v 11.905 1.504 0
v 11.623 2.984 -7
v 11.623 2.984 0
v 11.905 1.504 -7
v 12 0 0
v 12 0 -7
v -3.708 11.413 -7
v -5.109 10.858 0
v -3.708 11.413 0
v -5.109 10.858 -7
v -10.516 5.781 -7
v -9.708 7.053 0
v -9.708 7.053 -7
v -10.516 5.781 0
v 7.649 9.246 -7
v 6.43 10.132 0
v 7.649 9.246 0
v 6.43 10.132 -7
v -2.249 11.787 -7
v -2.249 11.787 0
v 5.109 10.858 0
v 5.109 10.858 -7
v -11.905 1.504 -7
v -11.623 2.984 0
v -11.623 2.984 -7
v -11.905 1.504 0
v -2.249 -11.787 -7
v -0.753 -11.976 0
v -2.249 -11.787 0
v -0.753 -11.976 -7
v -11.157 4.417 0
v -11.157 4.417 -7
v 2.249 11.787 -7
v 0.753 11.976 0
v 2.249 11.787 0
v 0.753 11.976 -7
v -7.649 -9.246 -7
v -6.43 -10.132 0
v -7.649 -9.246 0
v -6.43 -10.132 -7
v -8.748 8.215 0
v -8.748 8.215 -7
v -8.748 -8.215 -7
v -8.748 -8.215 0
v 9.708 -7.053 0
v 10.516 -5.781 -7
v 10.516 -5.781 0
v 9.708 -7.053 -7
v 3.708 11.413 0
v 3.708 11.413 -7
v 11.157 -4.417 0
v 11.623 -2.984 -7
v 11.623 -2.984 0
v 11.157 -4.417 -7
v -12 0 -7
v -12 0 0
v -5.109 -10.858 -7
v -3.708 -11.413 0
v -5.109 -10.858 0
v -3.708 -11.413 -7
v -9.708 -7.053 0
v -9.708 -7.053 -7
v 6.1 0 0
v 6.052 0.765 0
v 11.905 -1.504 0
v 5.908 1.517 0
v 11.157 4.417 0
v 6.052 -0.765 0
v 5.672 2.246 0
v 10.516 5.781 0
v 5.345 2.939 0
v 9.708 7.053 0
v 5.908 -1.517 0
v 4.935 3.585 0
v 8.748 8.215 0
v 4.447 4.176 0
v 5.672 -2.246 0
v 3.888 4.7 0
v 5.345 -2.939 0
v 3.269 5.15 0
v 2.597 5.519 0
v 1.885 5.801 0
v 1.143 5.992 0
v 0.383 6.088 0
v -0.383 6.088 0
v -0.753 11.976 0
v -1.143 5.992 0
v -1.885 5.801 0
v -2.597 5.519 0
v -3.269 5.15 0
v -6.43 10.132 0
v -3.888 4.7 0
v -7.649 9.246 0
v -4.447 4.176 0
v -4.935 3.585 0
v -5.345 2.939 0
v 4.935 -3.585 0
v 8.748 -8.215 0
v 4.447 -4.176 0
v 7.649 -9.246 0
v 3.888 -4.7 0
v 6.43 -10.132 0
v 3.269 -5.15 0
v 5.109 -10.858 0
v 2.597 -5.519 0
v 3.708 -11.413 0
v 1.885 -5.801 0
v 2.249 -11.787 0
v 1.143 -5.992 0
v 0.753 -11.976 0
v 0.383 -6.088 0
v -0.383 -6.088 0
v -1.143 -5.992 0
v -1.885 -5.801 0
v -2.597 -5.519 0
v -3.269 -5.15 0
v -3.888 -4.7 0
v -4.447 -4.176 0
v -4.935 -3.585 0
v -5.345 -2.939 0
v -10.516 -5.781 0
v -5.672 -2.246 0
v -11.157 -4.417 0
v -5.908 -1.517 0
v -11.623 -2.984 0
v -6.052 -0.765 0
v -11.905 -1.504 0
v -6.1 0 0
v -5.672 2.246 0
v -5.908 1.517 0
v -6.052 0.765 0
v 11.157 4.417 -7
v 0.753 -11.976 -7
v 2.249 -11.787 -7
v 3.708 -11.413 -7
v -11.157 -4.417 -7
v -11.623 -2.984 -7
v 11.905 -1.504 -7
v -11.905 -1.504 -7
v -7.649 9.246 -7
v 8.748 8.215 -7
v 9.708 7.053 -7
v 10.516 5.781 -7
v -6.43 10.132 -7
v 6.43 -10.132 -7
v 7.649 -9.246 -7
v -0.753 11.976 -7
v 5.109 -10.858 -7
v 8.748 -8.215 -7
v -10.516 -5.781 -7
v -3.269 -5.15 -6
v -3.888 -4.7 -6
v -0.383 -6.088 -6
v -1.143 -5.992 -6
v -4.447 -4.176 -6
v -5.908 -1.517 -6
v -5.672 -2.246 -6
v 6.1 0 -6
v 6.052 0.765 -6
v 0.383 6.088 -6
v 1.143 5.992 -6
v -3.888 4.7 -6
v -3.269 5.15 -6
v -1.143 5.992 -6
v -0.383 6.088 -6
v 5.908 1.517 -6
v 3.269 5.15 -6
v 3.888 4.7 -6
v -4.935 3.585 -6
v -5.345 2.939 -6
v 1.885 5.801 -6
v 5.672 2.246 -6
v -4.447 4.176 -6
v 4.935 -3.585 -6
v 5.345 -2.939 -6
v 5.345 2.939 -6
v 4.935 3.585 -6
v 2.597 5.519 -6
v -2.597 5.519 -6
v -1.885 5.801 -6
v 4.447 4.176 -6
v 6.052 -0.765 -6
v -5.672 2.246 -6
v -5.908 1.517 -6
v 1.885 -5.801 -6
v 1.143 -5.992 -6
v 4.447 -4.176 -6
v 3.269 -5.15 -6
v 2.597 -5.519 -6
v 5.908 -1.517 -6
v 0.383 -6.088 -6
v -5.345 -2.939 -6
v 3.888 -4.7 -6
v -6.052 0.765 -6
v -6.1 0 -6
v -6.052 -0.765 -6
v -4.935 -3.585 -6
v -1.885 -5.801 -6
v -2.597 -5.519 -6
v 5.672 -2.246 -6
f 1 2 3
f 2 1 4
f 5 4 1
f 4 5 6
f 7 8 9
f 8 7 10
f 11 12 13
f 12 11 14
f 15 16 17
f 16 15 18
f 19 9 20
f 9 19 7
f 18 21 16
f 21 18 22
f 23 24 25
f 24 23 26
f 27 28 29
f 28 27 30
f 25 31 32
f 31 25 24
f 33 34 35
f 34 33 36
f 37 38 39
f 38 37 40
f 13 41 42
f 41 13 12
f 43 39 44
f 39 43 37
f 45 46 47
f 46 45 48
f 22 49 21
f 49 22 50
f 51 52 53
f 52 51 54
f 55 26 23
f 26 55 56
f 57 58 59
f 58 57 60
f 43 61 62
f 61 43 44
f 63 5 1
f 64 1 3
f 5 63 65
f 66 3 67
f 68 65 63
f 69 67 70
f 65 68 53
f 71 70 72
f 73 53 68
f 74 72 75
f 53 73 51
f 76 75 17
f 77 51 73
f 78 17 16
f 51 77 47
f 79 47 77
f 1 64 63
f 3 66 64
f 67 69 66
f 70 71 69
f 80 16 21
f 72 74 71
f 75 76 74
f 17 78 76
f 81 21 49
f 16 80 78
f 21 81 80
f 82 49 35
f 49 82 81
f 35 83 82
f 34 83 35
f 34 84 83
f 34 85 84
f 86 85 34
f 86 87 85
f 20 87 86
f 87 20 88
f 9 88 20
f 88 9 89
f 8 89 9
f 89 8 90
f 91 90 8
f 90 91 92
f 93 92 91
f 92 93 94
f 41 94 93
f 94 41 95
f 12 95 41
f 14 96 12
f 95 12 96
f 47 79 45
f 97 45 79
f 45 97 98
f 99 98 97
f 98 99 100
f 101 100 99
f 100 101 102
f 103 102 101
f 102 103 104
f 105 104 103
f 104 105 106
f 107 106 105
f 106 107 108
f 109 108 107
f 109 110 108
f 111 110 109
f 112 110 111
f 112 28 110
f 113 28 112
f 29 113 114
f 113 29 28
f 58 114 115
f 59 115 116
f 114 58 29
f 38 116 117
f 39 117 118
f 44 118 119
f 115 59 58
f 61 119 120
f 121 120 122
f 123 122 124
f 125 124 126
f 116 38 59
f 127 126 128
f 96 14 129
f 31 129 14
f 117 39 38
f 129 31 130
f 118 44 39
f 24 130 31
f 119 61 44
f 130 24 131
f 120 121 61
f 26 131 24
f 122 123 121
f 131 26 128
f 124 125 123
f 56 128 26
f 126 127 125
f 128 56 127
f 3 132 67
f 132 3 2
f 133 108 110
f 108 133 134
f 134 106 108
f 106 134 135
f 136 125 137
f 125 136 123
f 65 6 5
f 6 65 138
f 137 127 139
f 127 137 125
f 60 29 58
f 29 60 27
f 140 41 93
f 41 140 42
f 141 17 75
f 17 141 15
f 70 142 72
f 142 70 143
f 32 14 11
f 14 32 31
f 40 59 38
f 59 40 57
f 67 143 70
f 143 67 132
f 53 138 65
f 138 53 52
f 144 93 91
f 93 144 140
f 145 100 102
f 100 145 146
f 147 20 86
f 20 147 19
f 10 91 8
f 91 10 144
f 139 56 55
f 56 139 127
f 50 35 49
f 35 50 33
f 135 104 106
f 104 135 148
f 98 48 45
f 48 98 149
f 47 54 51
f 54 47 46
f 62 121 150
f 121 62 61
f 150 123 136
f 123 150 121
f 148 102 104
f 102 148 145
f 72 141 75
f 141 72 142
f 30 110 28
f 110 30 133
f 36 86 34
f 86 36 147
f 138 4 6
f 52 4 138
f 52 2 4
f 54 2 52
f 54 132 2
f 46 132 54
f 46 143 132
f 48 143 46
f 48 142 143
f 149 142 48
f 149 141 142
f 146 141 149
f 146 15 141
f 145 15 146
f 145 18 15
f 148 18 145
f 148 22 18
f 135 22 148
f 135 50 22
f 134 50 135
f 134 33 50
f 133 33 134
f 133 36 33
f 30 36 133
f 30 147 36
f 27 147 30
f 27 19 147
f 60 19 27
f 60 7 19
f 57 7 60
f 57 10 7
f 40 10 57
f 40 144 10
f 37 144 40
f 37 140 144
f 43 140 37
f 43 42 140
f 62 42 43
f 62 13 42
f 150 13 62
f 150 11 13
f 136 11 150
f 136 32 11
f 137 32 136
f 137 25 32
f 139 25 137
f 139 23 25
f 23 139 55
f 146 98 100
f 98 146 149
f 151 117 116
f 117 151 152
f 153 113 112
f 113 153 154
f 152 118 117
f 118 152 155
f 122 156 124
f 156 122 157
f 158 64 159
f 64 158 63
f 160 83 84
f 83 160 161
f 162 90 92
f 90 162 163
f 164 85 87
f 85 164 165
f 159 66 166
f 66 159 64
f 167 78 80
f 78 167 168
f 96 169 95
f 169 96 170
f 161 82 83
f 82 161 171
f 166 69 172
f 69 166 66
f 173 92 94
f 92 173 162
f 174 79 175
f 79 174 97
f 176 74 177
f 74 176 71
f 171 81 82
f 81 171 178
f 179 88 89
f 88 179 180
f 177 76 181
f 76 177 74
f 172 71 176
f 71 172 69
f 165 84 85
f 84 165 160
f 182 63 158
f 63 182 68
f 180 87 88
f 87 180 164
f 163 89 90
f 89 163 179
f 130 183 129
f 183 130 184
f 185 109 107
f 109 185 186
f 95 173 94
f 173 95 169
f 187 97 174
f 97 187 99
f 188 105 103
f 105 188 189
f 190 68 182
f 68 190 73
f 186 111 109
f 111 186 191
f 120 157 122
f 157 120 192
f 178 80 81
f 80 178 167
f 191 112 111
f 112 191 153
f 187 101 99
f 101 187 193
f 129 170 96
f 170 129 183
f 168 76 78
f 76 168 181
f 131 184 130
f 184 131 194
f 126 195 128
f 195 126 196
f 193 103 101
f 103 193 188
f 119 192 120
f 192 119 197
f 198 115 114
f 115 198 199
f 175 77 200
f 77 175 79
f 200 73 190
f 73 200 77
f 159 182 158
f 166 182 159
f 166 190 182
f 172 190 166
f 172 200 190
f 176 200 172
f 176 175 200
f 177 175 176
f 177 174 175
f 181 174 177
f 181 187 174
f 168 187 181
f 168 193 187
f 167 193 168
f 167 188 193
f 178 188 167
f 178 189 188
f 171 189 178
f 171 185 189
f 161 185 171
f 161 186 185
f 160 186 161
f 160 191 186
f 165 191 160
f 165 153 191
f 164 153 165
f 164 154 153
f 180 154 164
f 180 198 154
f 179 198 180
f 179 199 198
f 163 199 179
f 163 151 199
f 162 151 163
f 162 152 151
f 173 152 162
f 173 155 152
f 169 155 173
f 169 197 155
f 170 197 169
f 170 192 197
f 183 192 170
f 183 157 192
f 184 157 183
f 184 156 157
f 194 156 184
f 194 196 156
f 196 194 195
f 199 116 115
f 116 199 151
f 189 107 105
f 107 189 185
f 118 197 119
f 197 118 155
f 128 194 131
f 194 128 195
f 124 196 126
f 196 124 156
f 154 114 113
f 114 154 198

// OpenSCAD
$fn = 50;


difference() {
	union() {
		translate(v = [0, 0, -7.0000000000]) {
			cylinder(h = 7, r = 12.0000000000);
		}
	}
	union() {
		#translate(v = [0, 0, -6.0000000000]) {
			cylinder(h = 6, r = 6.1000000000);
		}
	}
}
